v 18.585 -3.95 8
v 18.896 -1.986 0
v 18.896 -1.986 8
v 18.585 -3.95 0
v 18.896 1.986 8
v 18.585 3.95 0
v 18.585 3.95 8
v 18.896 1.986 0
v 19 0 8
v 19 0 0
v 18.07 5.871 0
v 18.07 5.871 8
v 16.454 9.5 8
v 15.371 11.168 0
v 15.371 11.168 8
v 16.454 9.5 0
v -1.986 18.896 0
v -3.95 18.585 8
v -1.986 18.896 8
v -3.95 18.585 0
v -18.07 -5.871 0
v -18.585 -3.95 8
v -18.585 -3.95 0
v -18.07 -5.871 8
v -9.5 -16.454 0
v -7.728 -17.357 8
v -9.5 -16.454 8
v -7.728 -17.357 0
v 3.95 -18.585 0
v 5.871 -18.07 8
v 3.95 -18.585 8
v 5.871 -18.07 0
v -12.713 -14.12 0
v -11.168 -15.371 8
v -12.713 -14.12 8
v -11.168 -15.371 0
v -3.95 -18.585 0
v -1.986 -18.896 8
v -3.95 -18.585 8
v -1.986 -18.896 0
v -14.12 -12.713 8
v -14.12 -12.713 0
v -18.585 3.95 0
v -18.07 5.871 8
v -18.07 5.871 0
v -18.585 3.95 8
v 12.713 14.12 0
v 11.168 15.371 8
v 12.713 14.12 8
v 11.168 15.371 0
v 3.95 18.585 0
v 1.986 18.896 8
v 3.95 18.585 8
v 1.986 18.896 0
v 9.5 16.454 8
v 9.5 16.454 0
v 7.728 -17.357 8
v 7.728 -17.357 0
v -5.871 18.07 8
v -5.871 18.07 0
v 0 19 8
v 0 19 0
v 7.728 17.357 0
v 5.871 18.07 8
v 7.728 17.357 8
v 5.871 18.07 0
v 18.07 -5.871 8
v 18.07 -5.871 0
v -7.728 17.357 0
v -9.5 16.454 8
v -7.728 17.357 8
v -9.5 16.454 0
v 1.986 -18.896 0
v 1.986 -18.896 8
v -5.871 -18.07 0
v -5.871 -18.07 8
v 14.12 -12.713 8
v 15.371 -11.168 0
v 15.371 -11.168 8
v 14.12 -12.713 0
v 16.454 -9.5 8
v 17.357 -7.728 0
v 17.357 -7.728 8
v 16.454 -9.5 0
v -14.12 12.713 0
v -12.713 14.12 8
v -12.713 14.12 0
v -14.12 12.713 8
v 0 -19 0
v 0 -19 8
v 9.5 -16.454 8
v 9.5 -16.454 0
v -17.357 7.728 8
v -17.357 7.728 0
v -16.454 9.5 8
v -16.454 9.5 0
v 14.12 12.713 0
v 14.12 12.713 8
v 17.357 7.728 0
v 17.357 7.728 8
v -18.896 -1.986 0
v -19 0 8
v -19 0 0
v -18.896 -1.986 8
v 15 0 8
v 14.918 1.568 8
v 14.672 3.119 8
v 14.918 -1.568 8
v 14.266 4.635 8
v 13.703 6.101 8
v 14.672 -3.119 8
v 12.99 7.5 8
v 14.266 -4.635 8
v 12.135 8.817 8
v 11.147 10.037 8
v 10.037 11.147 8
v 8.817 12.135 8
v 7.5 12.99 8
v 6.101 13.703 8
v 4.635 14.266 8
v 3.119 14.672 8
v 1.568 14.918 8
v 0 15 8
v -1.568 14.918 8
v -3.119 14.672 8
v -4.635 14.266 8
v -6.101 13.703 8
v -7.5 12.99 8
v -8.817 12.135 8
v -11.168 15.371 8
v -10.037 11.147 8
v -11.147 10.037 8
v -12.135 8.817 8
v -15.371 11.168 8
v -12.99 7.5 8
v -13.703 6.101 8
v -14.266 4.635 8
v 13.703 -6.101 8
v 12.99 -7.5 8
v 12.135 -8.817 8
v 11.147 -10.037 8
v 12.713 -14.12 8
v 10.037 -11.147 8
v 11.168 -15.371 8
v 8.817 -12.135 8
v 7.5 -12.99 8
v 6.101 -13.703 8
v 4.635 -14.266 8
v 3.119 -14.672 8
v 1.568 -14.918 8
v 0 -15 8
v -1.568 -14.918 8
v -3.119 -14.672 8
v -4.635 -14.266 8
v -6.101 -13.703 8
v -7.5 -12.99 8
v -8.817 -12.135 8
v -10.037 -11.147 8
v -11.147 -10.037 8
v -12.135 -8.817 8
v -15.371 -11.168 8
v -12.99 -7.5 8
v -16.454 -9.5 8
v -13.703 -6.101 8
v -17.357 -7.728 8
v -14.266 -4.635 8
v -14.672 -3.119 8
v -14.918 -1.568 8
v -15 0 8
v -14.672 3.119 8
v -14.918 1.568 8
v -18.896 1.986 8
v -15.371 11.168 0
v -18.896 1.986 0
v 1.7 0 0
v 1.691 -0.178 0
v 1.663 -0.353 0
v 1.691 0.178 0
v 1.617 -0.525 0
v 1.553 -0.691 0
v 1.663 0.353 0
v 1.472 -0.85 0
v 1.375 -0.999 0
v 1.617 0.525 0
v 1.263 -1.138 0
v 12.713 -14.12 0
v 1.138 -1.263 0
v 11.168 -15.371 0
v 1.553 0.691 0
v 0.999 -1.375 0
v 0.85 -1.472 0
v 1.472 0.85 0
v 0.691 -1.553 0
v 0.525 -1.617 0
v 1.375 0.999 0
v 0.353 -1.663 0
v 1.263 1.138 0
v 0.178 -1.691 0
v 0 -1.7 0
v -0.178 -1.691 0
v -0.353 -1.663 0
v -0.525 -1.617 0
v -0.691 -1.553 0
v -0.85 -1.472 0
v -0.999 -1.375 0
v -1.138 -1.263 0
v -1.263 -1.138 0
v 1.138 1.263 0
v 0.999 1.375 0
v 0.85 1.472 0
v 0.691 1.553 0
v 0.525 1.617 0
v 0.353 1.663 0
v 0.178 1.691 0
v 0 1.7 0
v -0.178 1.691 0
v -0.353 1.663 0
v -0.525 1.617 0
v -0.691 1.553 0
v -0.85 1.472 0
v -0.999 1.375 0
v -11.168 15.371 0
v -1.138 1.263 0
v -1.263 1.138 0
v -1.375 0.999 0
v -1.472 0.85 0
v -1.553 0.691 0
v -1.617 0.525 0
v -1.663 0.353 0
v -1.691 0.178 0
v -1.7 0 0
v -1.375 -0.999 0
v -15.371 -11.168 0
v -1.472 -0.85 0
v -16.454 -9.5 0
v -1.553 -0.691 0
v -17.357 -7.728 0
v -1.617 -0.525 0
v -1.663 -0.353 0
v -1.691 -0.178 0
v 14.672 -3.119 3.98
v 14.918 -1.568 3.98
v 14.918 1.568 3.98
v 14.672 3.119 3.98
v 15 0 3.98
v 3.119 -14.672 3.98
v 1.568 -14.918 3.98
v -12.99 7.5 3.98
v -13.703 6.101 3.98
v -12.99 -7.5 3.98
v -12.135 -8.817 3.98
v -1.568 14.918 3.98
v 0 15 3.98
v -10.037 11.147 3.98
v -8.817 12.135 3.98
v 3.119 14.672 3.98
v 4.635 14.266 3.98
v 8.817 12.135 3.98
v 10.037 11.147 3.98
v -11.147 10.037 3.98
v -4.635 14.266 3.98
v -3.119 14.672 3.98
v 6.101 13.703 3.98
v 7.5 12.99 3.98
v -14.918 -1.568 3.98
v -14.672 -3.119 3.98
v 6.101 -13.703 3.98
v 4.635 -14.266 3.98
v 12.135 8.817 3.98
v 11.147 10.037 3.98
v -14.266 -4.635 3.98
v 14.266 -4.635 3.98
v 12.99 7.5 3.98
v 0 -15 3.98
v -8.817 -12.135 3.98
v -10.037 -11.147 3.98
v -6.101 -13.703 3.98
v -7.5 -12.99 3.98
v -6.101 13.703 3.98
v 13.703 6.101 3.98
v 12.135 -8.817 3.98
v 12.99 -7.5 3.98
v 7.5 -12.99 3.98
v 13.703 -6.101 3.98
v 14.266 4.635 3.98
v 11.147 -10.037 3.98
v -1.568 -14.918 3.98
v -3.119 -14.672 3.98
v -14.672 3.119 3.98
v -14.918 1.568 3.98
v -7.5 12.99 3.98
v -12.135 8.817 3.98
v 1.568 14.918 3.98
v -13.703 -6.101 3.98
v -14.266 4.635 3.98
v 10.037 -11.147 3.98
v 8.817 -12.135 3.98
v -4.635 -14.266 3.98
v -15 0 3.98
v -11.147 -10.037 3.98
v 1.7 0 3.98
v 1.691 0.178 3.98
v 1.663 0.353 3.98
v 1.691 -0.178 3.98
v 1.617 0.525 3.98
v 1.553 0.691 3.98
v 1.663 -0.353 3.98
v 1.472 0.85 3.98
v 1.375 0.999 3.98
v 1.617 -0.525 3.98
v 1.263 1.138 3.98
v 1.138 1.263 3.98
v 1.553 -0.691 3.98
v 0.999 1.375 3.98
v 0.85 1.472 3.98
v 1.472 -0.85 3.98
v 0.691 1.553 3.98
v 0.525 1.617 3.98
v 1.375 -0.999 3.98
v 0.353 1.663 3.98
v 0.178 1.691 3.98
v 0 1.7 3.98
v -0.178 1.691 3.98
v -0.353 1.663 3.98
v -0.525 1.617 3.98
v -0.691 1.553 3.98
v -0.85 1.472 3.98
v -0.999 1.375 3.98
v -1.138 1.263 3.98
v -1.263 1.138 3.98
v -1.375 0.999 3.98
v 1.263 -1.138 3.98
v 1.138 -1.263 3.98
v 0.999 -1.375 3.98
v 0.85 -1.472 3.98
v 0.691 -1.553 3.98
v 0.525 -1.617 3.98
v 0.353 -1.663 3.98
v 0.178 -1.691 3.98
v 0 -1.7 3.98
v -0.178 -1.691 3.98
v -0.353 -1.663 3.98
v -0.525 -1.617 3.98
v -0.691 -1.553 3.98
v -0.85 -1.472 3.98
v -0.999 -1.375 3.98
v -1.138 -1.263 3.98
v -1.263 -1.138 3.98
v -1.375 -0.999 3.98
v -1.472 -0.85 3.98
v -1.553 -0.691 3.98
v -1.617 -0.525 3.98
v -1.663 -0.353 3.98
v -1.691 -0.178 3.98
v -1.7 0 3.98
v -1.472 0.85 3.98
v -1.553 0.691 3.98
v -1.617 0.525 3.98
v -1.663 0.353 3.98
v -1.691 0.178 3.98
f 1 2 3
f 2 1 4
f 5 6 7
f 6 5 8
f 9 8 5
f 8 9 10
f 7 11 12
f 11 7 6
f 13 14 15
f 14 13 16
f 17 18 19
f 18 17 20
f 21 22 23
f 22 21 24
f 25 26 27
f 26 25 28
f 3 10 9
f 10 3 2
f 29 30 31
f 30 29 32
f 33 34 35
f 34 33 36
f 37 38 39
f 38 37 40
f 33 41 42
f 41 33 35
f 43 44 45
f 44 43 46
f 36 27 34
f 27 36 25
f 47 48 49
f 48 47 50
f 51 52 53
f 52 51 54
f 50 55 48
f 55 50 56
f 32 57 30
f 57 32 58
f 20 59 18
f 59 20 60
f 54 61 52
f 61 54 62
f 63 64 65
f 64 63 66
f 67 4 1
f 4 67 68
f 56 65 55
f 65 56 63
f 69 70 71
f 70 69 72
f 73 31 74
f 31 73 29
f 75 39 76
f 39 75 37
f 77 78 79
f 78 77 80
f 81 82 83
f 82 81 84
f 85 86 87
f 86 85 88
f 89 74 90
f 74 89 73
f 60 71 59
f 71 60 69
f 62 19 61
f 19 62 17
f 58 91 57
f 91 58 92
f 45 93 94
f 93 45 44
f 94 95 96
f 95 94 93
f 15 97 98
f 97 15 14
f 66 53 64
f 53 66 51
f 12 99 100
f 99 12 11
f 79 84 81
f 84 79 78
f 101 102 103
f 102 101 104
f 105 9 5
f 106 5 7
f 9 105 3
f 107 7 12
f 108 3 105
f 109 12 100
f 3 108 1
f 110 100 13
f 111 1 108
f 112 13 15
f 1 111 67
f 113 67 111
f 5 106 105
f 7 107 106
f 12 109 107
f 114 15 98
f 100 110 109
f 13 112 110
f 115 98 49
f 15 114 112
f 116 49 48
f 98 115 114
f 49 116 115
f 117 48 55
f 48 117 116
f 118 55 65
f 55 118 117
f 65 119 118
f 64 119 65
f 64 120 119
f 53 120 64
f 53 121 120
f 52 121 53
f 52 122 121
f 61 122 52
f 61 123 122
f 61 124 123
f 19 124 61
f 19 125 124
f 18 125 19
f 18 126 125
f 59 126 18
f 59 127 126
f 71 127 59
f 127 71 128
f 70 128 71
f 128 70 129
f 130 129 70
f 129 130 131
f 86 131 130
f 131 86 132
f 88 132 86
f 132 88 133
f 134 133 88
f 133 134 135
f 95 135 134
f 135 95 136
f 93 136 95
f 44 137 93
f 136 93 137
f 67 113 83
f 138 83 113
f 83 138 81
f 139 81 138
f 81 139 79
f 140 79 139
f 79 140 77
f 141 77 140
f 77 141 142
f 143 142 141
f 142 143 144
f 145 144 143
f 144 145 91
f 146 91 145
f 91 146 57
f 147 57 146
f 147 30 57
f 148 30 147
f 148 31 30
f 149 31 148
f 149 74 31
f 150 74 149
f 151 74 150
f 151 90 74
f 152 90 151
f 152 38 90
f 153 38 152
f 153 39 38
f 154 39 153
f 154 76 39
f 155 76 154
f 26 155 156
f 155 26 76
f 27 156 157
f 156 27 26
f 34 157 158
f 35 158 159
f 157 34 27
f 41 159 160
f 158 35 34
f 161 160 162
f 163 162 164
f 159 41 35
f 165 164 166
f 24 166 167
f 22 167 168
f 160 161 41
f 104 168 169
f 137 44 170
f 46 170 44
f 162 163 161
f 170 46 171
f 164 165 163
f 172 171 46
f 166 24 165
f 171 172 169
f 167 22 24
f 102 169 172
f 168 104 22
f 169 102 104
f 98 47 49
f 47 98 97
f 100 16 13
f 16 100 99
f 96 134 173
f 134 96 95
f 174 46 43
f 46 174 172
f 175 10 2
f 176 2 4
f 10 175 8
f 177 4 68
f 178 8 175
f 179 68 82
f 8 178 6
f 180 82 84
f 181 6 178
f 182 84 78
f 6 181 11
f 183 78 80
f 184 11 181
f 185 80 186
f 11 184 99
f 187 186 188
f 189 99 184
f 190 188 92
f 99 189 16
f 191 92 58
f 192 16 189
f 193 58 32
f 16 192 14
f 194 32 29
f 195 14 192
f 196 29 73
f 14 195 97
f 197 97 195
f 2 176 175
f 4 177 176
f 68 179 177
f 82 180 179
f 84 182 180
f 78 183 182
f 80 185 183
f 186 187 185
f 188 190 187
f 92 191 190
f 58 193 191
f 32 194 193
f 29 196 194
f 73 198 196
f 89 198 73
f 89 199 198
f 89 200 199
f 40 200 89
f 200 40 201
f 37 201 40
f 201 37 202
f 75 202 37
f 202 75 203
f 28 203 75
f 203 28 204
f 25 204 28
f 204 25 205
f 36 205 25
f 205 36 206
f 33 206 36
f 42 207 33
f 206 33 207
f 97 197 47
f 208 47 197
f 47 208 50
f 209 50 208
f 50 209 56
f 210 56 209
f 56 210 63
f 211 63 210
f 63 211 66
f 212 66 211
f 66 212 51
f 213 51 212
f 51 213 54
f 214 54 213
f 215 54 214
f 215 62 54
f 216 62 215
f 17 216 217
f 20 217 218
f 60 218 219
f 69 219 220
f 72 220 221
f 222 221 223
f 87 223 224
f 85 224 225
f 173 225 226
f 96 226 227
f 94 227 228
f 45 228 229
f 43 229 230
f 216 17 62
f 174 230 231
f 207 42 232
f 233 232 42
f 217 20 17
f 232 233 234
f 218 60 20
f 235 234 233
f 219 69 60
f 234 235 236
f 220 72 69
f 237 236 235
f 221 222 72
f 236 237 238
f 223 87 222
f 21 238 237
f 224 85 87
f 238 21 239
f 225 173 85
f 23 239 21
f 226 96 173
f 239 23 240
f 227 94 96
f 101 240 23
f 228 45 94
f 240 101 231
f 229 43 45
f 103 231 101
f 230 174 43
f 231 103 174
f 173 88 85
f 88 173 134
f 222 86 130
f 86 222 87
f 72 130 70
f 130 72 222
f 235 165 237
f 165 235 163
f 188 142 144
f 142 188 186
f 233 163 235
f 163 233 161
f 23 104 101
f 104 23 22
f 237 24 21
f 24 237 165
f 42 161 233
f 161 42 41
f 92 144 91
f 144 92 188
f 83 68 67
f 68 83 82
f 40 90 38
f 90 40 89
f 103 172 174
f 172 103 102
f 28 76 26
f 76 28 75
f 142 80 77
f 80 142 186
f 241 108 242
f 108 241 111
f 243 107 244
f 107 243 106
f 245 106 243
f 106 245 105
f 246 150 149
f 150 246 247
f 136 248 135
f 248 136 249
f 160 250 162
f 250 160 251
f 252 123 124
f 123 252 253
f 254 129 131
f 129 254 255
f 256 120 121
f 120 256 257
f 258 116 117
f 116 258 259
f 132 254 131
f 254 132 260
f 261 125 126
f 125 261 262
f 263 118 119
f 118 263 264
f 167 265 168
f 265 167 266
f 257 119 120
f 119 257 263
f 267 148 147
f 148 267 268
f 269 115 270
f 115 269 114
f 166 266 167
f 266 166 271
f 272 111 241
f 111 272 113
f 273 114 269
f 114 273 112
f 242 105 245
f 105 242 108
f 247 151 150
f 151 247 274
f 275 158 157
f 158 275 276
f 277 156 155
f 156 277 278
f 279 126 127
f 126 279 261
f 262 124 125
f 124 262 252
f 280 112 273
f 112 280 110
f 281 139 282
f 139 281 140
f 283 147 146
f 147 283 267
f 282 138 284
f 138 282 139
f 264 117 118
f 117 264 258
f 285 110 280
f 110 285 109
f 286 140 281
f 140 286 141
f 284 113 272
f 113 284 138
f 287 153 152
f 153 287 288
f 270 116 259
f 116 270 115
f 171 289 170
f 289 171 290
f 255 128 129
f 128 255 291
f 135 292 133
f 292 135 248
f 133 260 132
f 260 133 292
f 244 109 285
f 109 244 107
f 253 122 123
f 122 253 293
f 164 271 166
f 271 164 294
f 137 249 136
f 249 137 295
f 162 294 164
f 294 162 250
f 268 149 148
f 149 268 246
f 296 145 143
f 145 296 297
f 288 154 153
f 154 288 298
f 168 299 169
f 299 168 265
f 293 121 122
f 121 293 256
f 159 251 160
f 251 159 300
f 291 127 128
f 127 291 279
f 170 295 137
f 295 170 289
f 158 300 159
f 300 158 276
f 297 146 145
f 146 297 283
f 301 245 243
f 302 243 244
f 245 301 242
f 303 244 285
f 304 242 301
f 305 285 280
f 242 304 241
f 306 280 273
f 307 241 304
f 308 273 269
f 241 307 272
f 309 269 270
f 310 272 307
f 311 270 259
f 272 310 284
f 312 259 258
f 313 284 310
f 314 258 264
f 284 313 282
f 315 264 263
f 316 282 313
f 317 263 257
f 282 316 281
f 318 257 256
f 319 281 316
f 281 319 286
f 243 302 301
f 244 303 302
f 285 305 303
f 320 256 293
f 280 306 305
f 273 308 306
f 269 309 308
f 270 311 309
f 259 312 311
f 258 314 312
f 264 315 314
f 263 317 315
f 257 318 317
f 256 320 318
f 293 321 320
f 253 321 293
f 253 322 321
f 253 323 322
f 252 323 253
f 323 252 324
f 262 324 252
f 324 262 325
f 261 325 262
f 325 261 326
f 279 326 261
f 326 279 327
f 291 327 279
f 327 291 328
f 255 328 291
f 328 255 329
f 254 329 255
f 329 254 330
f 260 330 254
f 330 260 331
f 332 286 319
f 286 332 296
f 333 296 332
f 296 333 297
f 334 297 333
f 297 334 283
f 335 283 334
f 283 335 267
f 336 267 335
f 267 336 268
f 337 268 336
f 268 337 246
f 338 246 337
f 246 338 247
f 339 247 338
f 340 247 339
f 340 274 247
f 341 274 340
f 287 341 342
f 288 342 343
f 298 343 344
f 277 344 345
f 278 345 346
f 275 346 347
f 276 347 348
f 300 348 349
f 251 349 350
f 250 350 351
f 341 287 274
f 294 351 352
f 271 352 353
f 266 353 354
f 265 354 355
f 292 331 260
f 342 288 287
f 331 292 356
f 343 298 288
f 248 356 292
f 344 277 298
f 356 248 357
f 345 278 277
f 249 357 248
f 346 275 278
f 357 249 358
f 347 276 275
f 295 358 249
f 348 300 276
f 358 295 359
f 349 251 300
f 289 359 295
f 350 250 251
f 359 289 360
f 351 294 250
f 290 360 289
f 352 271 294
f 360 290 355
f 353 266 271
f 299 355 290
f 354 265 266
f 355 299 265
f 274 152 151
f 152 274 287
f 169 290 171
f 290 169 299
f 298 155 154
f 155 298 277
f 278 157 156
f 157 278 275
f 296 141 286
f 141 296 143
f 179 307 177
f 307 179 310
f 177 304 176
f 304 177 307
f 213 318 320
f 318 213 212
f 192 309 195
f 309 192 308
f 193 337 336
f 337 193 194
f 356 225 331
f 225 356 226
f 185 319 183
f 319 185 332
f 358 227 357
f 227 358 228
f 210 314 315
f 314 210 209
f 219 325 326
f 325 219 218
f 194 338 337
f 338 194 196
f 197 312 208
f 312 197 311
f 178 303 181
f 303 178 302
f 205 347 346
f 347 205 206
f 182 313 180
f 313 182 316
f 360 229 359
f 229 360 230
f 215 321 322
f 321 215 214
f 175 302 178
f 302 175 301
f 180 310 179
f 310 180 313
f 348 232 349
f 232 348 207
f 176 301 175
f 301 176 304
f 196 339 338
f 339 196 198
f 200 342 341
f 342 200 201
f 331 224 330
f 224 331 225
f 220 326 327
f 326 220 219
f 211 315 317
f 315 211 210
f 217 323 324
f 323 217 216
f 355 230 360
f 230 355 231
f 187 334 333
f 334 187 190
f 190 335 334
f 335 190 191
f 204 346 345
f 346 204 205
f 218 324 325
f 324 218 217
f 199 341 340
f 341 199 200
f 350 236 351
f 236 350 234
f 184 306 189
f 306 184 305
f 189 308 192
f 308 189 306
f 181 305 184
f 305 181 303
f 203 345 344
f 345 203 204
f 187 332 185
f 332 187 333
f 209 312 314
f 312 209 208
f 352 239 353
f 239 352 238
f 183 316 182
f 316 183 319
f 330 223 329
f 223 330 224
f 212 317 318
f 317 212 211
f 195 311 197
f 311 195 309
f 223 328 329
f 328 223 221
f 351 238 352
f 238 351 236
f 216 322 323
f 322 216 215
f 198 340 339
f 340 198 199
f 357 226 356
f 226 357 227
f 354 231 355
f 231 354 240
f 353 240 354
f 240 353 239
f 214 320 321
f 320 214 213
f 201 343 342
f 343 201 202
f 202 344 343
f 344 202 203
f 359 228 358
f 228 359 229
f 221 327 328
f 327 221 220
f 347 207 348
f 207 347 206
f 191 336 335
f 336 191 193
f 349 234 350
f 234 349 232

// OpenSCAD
// Recessed magnet cup.
$fn = 60;
eps = 0.02;
magnet_d = 30;
wall = 4;
outer_d = magnet_d+2*wall;
height = wall+4;
difference() {
    cylinder(d=outer_d,h=height);
    translate([0,0,wall-eps]) cylinder(d=magnet_d,h=height-wall+2*eps);
    translate([0,0,-eps]) cylinder(d=3.4,h=wall+2*eps);
}
